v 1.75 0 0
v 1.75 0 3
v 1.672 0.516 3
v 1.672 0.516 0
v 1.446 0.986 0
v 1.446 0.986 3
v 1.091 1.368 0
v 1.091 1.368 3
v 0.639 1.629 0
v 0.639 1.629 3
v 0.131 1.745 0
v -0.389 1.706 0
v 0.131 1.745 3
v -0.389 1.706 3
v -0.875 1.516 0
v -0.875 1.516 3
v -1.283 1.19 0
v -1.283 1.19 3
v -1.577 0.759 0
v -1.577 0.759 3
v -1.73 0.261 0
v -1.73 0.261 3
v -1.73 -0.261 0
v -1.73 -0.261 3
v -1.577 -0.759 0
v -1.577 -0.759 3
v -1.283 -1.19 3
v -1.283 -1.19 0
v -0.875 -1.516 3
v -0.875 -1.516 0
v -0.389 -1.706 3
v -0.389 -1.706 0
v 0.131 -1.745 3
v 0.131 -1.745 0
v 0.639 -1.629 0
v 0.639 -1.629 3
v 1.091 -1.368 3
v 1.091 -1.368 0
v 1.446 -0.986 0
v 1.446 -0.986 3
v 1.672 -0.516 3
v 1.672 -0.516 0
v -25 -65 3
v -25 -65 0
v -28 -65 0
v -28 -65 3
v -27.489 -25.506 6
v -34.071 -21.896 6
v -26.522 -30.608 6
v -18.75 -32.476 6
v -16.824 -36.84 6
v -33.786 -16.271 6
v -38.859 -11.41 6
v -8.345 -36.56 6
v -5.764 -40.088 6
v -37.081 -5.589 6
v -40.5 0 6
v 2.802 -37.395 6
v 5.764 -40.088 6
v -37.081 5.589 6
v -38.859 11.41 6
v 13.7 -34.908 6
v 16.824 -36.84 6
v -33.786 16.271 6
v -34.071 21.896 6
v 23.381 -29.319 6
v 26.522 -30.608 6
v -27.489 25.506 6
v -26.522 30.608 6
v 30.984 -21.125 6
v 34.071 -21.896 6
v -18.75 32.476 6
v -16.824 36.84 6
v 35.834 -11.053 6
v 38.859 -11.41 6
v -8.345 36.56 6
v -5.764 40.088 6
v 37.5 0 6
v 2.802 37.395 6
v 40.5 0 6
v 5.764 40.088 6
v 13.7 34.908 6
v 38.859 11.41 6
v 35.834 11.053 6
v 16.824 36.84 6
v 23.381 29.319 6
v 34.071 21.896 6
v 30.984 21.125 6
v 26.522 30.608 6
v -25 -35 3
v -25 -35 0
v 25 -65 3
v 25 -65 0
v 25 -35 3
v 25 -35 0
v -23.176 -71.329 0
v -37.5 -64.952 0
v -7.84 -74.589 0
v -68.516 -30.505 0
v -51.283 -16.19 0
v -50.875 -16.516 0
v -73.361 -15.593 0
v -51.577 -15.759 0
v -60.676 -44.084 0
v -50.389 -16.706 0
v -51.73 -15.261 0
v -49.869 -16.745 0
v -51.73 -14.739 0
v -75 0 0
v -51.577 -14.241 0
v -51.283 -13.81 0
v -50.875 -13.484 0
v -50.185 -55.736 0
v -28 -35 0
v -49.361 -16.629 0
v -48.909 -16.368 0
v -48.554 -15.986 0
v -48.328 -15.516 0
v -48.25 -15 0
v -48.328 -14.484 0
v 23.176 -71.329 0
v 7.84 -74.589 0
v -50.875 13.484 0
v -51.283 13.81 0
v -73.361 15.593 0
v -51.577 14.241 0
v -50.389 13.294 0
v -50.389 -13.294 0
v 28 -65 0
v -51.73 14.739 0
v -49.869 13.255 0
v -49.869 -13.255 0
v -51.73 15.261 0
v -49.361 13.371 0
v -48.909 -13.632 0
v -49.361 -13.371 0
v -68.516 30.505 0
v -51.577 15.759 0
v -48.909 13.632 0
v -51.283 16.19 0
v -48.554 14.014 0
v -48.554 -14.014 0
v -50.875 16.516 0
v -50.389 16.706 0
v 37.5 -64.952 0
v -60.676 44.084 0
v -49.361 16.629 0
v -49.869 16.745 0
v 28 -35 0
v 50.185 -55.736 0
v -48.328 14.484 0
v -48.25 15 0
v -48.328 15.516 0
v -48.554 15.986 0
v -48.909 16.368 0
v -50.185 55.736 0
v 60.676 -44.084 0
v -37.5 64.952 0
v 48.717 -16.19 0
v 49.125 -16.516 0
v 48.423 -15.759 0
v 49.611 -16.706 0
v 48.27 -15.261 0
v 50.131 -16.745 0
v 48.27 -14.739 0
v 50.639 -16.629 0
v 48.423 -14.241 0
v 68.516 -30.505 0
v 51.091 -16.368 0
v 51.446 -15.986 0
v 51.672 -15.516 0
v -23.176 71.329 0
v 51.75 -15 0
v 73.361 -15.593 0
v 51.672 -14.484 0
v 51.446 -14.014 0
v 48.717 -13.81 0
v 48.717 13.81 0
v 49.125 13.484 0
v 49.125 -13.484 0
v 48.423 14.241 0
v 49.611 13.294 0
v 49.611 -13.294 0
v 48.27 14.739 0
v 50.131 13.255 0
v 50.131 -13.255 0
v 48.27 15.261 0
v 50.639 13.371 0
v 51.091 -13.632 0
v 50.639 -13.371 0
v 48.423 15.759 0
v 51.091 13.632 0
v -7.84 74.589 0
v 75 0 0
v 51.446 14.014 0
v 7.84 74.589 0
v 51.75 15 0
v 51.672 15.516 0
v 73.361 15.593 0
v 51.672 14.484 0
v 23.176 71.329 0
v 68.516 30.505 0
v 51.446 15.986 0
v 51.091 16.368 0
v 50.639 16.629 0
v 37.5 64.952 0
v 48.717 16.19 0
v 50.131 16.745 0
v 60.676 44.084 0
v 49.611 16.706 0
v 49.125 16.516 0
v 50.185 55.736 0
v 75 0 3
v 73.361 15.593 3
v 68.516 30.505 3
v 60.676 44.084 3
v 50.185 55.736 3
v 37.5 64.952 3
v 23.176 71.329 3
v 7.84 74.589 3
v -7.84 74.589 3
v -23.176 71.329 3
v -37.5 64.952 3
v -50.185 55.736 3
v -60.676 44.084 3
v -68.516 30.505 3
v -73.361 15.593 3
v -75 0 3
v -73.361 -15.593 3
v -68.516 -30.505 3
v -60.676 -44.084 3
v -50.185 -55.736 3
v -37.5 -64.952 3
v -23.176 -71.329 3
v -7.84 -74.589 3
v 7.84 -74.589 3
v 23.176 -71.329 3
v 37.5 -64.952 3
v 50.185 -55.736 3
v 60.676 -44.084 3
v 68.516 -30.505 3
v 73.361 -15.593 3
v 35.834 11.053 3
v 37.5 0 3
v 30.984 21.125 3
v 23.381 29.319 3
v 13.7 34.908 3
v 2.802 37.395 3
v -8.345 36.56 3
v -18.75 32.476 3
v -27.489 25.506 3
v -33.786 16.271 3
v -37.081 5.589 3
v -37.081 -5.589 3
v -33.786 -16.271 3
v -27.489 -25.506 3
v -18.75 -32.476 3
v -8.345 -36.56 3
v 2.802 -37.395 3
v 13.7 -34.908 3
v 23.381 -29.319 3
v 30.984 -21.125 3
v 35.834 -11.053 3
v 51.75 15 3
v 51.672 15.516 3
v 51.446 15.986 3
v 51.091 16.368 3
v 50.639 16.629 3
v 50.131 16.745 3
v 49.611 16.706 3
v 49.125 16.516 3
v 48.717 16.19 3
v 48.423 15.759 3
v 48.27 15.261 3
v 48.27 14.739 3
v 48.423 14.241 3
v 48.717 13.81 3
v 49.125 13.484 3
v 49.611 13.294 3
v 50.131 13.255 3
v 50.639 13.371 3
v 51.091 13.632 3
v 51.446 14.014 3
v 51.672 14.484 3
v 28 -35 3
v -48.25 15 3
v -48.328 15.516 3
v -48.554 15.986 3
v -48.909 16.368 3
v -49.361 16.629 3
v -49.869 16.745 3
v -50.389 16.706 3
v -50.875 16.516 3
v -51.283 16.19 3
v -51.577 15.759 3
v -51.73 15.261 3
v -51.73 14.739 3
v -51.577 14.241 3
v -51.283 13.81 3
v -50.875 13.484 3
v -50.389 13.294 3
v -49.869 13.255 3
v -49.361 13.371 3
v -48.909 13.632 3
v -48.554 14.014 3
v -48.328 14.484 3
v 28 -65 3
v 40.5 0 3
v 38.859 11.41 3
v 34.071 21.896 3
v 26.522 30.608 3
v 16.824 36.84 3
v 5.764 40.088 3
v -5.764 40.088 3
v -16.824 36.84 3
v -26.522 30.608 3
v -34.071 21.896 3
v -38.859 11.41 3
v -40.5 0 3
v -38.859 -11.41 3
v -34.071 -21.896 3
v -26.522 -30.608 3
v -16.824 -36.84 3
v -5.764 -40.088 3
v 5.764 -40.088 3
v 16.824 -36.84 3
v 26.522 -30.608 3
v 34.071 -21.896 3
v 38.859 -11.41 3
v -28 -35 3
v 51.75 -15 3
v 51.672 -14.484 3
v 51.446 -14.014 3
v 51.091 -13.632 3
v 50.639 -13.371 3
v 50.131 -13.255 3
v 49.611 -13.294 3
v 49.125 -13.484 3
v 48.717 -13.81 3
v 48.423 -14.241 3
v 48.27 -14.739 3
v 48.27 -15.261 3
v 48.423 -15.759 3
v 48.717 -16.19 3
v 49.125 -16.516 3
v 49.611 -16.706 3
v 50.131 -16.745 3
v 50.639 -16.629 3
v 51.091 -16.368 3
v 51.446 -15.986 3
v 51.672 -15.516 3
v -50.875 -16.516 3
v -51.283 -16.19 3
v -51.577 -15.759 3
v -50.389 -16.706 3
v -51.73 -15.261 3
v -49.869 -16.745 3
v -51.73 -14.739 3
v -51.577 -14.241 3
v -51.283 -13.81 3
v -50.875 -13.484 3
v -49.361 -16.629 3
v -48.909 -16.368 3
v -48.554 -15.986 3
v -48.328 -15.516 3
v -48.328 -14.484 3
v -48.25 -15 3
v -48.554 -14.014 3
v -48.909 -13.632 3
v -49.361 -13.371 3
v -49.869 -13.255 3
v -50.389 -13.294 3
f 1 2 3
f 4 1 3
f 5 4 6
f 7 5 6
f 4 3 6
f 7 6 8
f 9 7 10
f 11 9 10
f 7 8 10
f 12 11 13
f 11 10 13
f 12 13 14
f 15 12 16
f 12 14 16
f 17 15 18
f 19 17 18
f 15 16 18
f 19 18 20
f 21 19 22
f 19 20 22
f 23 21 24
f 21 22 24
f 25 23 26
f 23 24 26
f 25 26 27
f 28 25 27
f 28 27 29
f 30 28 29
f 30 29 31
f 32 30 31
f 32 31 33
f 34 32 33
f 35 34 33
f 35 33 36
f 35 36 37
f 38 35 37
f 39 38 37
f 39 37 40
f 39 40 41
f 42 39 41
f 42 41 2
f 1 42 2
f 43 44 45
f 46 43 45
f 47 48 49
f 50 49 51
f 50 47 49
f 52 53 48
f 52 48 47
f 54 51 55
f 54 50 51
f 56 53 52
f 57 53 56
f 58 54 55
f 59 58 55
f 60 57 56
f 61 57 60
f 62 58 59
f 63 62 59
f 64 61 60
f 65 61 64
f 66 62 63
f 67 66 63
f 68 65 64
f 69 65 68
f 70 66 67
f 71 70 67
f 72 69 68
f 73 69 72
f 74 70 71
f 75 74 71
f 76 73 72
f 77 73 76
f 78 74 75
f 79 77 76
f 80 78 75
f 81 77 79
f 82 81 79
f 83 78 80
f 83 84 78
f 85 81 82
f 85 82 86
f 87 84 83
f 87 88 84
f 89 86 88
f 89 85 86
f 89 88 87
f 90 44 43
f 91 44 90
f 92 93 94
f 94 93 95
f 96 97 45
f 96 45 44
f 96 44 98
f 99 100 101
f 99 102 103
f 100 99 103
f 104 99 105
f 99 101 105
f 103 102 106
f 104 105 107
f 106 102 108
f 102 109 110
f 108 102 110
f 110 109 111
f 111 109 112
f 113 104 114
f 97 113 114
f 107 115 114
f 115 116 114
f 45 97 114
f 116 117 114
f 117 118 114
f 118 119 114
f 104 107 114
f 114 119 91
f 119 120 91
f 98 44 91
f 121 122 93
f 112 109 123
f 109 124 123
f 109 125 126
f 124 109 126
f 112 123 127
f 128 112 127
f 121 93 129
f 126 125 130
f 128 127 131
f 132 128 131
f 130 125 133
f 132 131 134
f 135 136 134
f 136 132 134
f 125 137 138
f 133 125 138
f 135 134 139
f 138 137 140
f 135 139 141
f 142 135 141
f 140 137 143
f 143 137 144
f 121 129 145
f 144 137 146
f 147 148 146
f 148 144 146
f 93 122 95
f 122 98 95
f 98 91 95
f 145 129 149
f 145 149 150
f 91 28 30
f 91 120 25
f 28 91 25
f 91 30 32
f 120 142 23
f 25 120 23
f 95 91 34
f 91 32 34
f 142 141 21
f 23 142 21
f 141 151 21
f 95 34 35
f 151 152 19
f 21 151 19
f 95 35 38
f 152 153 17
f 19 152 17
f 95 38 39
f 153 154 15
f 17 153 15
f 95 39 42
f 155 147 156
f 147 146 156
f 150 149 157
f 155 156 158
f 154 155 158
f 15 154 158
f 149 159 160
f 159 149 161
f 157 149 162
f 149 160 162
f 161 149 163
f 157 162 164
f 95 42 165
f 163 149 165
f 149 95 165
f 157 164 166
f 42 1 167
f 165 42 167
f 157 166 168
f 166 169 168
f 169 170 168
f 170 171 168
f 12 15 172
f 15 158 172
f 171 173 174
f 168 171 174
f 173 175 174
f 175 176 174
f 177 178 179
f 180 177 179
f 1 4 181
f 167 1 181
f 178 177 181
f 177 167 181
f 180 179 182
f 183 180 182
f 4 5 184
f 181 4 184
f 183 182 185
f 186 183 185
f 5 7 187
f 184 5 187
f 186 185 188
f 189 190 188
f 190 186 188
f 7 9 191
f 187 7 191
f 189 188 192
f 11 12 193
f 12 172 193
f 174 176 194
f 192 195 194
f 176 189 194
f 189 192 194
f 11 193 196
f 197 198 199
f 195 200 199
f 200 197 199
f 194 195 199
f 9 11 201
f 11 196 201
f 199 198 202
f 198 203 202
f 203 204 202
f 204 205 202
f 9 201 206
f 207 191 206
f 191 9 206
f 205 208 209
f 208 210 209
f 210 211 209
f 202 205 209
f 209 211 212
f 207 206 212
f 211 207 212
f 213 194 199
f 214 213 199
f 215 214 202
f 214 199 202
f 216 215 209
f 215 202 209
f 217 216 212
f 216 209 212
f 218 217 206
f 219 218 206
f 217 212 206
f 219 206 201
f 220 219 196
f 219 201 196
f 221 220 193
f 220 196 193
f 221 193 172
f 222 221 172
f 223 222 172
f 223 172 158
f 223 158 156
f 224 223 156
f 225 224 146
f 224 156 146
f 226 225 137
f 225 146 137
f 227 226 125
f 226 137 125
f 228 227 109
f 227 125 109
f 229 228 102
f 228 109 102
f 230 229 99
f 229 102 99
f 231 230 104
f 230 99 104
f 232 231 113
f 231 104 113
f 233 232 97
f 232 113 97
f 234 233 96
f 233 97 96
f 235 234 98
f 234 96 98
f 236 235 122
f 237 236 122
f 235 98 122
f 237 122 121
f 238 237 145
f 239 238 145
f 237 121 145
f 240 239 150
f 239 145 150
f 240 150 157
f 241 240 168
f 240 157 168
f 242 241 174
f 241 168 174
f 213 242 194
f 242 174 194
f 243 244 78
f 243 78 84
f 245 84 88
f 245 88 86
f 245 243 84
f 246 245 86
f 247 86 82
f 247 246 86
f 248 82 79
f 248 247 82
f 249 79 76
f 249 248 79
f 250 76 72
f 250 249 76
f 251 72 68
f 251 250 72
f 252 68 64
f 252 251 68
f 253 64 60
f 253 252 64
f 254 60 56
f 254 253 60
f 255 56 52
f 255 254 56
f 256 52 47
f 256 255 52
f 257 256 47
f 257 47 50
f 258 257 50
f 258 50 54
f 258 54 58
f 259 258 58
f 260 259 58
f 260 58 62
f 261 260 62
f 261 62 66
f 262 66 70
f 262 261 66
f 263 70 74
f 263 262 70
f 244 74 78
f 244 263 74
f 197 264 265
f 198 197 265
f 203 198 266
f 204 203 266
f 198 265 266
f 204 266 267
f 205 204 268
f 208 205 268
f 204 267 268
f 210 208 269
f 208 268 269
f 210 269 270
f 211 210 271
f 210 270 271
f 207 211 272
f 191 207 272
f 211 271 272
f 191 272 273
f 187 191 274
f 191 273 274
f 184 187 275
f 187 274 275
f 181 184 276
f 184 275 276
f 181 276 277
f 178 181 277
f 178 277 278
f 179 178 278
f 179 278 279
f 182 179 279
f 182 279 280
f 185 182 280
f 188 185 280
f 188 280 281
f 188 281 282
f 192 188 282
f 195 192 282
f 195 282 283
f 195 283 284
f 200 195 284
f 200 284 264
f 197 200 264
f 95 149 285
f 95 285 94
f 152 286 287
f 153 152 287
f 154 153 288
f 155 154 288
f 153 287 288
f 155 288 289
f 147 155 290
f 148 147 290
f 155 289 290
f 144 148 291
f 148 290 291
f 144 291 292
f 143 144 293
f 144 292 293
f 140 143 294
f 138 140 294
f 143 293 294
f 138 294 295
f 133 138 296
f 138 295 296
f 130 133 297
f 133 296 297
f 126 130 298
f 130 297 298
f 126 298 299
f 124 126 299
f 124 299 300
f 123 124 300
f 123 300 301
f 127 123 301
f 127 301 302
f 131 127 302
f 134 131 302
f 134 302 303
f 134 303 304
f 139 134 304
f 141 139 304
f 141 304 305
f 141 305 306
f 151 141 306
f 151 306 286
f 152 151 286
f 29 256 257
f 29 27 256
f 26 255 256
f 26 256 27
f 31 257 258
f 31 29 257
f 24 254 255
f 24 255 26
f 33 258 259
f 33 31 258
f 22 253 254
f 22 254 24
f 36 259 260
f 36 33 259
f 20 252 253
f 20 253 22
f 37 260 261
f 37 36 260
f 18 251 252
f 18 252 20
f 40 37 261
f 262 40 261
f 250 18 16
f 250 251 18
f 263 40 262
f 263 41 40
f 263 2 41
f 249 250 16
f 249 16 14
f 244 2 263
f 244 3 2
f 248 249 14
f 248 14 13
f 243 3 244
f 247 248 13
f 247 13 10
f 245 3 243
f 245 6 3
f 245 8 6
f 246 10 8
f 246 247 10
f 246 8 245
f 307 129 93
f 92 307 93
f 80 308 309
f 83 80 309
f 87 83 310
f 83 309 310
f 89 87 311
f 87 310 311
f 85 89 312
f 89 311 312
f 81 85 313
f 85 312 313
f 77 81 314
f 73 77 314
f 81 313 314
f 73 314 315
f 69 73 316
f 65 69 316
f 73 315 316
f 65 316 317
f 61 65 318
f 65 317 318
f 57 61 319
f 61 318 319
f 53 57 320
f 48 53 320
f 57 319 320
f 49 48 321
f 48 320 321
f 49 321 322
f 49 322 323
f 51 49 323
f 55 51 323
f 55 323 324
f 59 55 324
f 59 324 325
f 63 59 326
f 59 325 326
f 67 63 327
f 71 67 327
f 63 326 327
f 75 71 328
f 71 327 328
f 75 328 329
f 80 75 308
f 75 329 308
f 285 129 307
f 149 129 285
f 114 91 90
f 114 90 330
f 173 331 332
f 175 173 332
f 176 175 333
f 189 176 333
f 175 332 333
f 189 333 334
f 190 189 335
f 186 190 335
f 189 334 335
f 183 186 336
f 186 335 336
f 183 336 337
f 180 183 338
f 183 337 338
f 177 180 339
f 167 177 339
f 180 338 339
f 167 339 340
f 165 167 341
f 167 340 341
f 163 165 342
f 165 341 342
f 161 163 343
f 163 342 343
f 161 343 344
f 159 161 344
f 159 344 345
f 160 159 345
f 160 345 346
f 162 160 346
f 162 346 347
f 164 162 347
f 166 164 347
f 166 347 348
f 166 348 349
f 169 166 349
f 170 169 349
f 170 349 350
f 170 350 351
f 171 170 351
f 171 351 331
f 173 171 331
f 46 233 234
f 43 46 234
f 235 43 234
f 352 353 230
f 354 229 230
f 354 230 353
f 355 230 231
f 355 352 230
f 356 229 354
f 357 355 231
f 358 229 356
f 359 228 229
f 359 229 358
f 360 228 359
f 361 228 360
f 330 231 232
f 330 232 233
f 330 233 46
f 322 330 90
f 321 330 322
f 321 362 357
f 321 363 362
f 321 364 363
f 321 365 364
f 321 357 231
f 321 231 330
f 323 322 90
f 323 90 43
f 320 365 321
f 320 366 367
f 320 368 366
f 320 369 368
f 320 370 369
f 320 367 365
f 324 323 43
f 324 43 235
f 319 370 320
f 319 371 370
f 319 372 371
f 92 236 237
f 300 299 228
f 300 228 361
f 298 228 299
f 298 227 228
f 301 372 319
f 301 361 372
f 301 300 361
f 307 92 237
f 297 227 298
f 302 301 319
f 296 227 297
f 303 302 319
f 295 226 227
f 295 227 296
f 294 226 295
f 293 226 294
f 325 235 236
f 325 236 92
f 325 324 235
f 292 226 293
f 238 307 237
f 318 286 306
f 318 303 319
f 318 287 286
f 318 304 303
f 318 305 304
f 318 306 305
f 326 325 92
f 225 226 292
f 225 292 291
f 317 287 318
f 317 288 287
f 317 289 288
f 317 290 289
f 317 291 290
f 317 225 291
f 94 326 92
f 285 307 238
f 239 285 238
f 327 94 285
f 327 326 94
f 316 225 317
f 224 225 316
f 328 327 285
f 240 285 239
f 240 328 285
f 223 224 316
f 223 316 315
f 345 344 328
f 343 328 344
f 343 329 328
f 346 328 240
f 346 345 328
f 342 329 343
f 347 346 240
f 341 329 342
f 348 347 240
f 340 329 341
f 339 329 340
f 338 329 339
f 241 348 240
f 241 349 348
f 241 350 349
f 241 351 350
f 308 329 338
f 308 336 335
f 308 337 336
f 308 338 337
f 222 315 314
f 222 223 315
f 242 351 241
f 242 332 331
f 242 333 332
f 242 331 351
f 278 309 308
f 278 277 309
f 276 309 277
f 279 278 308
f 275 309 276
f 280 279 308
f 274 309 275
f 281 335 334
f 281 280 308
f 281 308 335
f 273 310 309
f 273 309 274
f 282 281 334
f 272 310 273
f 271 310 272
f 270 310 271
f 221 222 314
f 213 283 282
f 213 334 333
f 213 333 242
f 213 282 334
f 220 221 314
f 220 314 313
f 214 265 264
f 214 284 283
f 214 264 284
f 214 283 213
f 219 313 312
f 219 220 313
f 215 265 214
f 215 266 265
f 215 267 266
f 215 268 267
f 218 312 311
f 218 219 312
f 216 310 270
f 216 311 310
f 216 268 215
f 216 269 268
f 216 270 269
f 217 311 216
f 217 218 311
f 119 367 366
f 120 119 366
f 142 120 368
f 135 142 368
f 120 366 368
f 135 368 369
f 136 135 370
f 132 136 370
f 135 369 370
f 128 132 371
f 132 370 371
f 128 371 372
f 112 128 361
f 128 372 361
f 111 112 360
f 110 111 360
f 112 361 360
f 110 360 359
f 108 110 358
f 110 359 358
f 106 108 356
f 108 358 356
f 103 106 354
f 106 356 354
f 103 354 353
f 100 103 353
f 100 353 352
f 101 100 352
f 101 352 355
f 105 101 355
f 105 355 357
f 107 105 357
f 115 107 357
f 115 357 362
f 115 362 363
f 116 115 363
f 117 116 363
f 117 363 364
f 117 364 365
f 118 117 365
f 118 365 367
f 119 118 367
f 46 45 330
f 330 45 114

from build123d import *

# Parameters (mm, degrees)
SKETCH1_R           = 75
BOSS_EXTRUDE1_DEPTH = 3
SKETCH2_R           = 1.75
CUT_EXTRUDE1_DEPTH  = 107.108435103
SKETCH3_R           = 40.5
SKETCH3_R_2         = 37.5
BOSS_EXTRUDE2_DEPTH = 3
SKETCH4_W           = 3
SKETCH4_H           = 30
CUT_EXTRUDE2_DEPTH  = 107.235587258


with BuildPart() as part:
    # Sketch1 → Boss-Extrude1 (new body)
    with BuildSketch(Plane.XY):
        Circle(SKETCH1_R)
    extrude(amount=BOSS_EXTRUDE1_DEPTH)

    # Sketch2 → Cut-Extrude1 (cut, through all)
    with BuildSketch(Plane.XY.offset(3)):
        with Locations((-50, 15)):
            Circle(SKETCH2_R)
        with Locations((-50, -15)):
            Circle(SKETCH2_R)
        with Locations((50, -15)):
            Circle(SKETCH2_R)
        with Locations((50, 15)):
            Circle(SKETCH2_R)
        Circle(SKETCH2_R)
    extrude(amount=-CUT_EXTRUDE1_DEPTH, mode=Mode.SUBTRACT)

    # Sketch3 → Boss-Extrude2 (add)
    with BuildSketch(Plane.XY.offset(3)):
        Circle(SKETCH3_R)
        Circle(SKETCH3_R_2, mode=Mode.SUBTRACT)
    extrude(amount=BOSS_EXTRUDE2_DEPTH)

    # Sketch4 → Cut-Extrude2 (cut, through all)
    with BuildSketch(Plane(origin=(0, 0, 0), x_dir=(-1, 0, 0), z_dir=(0, 0, -1))):
        with Locations((-26.5, -50)):
            Rectangle(SKETCH4_W, SKETCH4_H)
        with Locations((26.5, -50)):
            Rectangle(SKETCH4_W, SKETCH4_H)
    extrude(amount=-CUT_EXTRUDE2_DEPTH, mode=Mode.SUBTRACT)


solid = part.part
